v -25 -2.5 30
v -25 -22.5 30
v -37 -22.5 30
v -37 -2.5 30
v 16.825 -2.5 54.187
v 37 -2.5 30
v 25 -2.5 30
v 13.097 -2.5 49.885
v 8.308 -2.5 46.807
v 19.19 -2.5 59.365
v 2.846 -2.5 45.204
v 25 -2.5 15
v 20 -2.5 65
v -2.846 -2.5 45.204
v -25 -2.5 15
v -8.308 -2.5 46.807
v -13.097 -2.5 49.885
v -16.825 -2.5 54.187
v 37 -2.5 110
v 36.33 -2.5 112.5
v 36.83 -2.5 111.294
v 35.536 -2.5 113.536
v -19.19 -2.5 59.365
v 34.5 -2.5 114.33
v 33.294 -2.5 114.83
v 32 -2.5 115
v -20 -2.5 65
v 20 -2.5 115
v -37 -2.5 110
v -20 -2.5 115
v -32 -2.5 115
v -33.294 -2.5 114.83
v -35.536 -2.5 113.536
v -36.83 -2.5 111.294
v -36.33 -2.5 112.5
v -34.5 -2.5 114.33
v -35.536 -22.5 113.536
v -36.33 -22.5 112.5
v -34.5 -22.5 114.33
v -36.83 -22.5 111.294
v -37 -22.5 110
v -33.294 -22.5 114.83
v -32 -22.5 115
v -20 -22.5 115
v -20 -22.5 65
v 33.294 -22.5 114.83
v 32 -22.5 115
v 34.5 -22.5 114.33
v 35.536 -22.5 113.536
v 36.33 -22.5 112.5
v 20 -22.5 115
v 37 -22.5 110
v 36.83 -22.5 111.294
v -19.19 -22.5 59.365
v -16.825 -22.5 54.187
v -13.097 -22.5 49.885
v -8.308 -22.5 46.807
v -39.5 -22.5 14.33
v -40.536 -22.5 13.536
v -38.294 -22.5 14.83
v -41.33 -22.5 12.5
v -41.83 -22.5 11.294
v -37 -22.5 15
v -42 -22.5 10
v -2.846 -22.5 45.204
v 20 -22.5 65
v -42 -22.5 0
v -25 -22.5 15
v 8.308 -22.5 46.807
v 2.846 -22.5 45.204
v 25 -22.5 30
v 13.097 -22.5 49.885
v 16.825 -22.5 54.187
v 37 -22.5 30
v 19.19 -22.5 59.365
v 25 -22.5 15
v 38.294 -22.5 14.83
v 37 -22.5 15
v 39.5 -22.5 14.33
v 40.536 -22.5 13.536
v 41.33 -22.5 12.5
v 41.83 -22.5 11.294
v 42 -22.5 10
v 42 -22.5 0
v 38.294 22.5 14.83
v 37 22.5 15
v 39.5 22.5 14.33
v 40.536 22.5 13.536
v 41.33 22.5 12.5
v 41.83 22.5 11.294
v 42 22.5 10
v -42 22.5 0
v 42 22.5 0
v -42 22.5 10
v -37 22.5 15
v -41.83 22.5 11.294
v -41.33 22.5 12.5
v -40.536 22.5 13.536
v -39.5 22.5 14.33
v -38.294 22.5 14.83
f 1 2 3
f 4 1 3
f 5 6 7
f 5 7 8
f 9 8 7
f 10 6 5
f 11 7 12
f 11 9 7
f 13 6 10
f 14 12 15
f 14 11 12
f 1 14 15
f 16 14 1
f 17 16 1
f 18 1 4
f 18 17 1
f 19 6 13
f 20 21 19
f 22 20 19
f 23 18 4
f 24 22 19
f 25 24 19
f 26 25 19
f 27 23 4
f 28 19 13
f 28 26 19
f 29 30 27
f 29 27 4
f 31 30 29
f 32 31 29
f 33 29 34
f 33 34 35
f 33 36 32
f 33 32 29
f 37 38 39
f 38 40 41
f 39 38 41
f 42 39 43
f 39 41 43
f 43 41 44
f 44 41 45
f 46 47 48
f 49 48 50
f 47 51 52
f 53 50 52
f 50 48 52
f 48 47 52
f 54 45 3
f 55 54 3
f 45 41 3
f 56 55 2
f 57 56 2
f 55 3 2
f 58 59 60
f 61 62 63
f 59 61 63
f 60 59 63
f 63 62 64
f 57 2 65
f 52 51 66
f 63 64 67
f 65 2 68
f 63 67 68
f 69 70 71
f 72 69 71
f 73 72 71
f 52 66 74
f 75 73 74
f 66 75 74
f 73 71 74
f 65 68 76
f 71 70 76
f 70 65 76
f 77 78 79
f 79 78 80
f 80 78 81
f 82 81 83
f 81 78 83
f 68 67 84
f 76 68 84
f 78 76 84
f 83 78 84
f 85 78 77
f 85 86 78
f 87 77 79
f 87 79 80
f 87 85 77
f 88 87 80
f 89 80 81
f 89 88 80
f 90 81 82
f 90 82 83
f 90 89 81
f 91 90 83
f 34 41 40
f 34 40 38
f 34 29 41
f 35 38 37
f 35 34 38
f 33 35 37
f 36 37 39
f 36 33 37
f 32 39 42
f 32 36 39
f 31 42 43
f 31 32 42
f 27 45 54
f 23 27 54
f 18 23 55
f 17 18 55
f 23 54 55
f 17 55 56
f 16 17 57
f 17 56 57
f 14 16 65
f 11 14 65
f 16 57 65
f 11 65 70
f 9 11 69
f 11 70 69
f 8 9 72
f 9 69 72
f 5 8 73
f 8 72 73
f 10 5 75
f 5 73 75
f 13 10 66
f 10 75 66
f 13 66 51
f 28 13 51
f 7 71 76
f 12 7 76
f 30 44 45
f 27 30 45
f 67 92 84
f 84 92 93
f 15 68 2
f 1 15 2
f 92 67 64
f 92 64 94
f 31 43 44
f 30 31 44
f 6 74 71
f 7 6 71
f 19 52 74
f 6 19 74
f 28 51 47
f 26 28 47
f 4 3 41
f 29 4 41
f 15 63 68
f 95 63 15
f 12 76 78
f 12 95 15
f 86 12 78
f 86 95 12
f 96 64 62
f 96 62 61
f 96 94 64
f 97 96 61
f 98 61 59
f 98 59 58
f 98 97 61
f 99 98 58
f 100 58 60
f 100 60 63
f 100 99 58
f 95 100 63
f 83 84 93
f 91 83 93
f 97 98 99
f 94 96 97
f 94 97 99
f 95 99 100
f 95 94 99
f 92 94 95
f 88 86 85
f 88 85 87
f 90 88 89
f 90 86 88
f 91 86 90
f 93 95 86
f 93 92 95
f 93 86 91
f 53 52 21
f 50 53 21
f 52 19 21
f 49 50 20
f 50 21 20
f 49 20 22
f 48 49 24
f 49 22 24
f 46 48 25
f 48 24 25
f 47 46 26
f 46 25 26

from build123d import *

# Parameters (mm, degrees)
ESQUISSE1_W        = 84
ESQUISSE1_H        = 45
BOSS_EXTRU_1_DEPTH = 15
BOSS_EXTRU_2_DEPTH = 20
CONG_1_R           = 5


with BuildPart() as part:
    # Esquisse1 → Boss.-Extru.1 (new body)
    with BuildSketch(Plane.XY):
        Rectangle(ESQUISSE1_W, ESQUISSE1_H)
    extrude(amount=BOSS_EXTRU_1_DEPTH)

    # Esquisse2 → Boss.-Extru.2 (add)
    with BuildSketch(Plane.XZ.offset(22.5)):
        with BuildLine():
            Line((37, 115), (37, 30))
            Line((37, 30), (25, 30))
            Line((25, 30), (25, 15))
            Line((25, 15), (0, 15))
            Line((0, 15), (-25, 15))
            Line((-25, 15), (-25, 30))
            Line((-25, 30), (-37, 30))
            Line((-37, 30), (-37, 115))
            Line((-37, 115), (-20, 115))
            Line((-20, 115), (-20, 65))
            ThreePointArc((-20, 65), (0, 45), (20, 65))
            Line((20, 65), (20, 115))
            Line((20, 115), (37, 115))
        make_face()
    extrude(amount=-BOSS_EXTRU_2_DEPTH)

    # Congé1
    cong_1_edges = [part.edges().sort_by_distance(p)[0] for p in [
        (42, 0, 15),
        (37, -12.5, 115),
        (-37, -12.5, 115),
        (-42, 0, 15),
    ]]
    fillet(cong_1_edges, radius=CONG_1_R)


solid = part.part
